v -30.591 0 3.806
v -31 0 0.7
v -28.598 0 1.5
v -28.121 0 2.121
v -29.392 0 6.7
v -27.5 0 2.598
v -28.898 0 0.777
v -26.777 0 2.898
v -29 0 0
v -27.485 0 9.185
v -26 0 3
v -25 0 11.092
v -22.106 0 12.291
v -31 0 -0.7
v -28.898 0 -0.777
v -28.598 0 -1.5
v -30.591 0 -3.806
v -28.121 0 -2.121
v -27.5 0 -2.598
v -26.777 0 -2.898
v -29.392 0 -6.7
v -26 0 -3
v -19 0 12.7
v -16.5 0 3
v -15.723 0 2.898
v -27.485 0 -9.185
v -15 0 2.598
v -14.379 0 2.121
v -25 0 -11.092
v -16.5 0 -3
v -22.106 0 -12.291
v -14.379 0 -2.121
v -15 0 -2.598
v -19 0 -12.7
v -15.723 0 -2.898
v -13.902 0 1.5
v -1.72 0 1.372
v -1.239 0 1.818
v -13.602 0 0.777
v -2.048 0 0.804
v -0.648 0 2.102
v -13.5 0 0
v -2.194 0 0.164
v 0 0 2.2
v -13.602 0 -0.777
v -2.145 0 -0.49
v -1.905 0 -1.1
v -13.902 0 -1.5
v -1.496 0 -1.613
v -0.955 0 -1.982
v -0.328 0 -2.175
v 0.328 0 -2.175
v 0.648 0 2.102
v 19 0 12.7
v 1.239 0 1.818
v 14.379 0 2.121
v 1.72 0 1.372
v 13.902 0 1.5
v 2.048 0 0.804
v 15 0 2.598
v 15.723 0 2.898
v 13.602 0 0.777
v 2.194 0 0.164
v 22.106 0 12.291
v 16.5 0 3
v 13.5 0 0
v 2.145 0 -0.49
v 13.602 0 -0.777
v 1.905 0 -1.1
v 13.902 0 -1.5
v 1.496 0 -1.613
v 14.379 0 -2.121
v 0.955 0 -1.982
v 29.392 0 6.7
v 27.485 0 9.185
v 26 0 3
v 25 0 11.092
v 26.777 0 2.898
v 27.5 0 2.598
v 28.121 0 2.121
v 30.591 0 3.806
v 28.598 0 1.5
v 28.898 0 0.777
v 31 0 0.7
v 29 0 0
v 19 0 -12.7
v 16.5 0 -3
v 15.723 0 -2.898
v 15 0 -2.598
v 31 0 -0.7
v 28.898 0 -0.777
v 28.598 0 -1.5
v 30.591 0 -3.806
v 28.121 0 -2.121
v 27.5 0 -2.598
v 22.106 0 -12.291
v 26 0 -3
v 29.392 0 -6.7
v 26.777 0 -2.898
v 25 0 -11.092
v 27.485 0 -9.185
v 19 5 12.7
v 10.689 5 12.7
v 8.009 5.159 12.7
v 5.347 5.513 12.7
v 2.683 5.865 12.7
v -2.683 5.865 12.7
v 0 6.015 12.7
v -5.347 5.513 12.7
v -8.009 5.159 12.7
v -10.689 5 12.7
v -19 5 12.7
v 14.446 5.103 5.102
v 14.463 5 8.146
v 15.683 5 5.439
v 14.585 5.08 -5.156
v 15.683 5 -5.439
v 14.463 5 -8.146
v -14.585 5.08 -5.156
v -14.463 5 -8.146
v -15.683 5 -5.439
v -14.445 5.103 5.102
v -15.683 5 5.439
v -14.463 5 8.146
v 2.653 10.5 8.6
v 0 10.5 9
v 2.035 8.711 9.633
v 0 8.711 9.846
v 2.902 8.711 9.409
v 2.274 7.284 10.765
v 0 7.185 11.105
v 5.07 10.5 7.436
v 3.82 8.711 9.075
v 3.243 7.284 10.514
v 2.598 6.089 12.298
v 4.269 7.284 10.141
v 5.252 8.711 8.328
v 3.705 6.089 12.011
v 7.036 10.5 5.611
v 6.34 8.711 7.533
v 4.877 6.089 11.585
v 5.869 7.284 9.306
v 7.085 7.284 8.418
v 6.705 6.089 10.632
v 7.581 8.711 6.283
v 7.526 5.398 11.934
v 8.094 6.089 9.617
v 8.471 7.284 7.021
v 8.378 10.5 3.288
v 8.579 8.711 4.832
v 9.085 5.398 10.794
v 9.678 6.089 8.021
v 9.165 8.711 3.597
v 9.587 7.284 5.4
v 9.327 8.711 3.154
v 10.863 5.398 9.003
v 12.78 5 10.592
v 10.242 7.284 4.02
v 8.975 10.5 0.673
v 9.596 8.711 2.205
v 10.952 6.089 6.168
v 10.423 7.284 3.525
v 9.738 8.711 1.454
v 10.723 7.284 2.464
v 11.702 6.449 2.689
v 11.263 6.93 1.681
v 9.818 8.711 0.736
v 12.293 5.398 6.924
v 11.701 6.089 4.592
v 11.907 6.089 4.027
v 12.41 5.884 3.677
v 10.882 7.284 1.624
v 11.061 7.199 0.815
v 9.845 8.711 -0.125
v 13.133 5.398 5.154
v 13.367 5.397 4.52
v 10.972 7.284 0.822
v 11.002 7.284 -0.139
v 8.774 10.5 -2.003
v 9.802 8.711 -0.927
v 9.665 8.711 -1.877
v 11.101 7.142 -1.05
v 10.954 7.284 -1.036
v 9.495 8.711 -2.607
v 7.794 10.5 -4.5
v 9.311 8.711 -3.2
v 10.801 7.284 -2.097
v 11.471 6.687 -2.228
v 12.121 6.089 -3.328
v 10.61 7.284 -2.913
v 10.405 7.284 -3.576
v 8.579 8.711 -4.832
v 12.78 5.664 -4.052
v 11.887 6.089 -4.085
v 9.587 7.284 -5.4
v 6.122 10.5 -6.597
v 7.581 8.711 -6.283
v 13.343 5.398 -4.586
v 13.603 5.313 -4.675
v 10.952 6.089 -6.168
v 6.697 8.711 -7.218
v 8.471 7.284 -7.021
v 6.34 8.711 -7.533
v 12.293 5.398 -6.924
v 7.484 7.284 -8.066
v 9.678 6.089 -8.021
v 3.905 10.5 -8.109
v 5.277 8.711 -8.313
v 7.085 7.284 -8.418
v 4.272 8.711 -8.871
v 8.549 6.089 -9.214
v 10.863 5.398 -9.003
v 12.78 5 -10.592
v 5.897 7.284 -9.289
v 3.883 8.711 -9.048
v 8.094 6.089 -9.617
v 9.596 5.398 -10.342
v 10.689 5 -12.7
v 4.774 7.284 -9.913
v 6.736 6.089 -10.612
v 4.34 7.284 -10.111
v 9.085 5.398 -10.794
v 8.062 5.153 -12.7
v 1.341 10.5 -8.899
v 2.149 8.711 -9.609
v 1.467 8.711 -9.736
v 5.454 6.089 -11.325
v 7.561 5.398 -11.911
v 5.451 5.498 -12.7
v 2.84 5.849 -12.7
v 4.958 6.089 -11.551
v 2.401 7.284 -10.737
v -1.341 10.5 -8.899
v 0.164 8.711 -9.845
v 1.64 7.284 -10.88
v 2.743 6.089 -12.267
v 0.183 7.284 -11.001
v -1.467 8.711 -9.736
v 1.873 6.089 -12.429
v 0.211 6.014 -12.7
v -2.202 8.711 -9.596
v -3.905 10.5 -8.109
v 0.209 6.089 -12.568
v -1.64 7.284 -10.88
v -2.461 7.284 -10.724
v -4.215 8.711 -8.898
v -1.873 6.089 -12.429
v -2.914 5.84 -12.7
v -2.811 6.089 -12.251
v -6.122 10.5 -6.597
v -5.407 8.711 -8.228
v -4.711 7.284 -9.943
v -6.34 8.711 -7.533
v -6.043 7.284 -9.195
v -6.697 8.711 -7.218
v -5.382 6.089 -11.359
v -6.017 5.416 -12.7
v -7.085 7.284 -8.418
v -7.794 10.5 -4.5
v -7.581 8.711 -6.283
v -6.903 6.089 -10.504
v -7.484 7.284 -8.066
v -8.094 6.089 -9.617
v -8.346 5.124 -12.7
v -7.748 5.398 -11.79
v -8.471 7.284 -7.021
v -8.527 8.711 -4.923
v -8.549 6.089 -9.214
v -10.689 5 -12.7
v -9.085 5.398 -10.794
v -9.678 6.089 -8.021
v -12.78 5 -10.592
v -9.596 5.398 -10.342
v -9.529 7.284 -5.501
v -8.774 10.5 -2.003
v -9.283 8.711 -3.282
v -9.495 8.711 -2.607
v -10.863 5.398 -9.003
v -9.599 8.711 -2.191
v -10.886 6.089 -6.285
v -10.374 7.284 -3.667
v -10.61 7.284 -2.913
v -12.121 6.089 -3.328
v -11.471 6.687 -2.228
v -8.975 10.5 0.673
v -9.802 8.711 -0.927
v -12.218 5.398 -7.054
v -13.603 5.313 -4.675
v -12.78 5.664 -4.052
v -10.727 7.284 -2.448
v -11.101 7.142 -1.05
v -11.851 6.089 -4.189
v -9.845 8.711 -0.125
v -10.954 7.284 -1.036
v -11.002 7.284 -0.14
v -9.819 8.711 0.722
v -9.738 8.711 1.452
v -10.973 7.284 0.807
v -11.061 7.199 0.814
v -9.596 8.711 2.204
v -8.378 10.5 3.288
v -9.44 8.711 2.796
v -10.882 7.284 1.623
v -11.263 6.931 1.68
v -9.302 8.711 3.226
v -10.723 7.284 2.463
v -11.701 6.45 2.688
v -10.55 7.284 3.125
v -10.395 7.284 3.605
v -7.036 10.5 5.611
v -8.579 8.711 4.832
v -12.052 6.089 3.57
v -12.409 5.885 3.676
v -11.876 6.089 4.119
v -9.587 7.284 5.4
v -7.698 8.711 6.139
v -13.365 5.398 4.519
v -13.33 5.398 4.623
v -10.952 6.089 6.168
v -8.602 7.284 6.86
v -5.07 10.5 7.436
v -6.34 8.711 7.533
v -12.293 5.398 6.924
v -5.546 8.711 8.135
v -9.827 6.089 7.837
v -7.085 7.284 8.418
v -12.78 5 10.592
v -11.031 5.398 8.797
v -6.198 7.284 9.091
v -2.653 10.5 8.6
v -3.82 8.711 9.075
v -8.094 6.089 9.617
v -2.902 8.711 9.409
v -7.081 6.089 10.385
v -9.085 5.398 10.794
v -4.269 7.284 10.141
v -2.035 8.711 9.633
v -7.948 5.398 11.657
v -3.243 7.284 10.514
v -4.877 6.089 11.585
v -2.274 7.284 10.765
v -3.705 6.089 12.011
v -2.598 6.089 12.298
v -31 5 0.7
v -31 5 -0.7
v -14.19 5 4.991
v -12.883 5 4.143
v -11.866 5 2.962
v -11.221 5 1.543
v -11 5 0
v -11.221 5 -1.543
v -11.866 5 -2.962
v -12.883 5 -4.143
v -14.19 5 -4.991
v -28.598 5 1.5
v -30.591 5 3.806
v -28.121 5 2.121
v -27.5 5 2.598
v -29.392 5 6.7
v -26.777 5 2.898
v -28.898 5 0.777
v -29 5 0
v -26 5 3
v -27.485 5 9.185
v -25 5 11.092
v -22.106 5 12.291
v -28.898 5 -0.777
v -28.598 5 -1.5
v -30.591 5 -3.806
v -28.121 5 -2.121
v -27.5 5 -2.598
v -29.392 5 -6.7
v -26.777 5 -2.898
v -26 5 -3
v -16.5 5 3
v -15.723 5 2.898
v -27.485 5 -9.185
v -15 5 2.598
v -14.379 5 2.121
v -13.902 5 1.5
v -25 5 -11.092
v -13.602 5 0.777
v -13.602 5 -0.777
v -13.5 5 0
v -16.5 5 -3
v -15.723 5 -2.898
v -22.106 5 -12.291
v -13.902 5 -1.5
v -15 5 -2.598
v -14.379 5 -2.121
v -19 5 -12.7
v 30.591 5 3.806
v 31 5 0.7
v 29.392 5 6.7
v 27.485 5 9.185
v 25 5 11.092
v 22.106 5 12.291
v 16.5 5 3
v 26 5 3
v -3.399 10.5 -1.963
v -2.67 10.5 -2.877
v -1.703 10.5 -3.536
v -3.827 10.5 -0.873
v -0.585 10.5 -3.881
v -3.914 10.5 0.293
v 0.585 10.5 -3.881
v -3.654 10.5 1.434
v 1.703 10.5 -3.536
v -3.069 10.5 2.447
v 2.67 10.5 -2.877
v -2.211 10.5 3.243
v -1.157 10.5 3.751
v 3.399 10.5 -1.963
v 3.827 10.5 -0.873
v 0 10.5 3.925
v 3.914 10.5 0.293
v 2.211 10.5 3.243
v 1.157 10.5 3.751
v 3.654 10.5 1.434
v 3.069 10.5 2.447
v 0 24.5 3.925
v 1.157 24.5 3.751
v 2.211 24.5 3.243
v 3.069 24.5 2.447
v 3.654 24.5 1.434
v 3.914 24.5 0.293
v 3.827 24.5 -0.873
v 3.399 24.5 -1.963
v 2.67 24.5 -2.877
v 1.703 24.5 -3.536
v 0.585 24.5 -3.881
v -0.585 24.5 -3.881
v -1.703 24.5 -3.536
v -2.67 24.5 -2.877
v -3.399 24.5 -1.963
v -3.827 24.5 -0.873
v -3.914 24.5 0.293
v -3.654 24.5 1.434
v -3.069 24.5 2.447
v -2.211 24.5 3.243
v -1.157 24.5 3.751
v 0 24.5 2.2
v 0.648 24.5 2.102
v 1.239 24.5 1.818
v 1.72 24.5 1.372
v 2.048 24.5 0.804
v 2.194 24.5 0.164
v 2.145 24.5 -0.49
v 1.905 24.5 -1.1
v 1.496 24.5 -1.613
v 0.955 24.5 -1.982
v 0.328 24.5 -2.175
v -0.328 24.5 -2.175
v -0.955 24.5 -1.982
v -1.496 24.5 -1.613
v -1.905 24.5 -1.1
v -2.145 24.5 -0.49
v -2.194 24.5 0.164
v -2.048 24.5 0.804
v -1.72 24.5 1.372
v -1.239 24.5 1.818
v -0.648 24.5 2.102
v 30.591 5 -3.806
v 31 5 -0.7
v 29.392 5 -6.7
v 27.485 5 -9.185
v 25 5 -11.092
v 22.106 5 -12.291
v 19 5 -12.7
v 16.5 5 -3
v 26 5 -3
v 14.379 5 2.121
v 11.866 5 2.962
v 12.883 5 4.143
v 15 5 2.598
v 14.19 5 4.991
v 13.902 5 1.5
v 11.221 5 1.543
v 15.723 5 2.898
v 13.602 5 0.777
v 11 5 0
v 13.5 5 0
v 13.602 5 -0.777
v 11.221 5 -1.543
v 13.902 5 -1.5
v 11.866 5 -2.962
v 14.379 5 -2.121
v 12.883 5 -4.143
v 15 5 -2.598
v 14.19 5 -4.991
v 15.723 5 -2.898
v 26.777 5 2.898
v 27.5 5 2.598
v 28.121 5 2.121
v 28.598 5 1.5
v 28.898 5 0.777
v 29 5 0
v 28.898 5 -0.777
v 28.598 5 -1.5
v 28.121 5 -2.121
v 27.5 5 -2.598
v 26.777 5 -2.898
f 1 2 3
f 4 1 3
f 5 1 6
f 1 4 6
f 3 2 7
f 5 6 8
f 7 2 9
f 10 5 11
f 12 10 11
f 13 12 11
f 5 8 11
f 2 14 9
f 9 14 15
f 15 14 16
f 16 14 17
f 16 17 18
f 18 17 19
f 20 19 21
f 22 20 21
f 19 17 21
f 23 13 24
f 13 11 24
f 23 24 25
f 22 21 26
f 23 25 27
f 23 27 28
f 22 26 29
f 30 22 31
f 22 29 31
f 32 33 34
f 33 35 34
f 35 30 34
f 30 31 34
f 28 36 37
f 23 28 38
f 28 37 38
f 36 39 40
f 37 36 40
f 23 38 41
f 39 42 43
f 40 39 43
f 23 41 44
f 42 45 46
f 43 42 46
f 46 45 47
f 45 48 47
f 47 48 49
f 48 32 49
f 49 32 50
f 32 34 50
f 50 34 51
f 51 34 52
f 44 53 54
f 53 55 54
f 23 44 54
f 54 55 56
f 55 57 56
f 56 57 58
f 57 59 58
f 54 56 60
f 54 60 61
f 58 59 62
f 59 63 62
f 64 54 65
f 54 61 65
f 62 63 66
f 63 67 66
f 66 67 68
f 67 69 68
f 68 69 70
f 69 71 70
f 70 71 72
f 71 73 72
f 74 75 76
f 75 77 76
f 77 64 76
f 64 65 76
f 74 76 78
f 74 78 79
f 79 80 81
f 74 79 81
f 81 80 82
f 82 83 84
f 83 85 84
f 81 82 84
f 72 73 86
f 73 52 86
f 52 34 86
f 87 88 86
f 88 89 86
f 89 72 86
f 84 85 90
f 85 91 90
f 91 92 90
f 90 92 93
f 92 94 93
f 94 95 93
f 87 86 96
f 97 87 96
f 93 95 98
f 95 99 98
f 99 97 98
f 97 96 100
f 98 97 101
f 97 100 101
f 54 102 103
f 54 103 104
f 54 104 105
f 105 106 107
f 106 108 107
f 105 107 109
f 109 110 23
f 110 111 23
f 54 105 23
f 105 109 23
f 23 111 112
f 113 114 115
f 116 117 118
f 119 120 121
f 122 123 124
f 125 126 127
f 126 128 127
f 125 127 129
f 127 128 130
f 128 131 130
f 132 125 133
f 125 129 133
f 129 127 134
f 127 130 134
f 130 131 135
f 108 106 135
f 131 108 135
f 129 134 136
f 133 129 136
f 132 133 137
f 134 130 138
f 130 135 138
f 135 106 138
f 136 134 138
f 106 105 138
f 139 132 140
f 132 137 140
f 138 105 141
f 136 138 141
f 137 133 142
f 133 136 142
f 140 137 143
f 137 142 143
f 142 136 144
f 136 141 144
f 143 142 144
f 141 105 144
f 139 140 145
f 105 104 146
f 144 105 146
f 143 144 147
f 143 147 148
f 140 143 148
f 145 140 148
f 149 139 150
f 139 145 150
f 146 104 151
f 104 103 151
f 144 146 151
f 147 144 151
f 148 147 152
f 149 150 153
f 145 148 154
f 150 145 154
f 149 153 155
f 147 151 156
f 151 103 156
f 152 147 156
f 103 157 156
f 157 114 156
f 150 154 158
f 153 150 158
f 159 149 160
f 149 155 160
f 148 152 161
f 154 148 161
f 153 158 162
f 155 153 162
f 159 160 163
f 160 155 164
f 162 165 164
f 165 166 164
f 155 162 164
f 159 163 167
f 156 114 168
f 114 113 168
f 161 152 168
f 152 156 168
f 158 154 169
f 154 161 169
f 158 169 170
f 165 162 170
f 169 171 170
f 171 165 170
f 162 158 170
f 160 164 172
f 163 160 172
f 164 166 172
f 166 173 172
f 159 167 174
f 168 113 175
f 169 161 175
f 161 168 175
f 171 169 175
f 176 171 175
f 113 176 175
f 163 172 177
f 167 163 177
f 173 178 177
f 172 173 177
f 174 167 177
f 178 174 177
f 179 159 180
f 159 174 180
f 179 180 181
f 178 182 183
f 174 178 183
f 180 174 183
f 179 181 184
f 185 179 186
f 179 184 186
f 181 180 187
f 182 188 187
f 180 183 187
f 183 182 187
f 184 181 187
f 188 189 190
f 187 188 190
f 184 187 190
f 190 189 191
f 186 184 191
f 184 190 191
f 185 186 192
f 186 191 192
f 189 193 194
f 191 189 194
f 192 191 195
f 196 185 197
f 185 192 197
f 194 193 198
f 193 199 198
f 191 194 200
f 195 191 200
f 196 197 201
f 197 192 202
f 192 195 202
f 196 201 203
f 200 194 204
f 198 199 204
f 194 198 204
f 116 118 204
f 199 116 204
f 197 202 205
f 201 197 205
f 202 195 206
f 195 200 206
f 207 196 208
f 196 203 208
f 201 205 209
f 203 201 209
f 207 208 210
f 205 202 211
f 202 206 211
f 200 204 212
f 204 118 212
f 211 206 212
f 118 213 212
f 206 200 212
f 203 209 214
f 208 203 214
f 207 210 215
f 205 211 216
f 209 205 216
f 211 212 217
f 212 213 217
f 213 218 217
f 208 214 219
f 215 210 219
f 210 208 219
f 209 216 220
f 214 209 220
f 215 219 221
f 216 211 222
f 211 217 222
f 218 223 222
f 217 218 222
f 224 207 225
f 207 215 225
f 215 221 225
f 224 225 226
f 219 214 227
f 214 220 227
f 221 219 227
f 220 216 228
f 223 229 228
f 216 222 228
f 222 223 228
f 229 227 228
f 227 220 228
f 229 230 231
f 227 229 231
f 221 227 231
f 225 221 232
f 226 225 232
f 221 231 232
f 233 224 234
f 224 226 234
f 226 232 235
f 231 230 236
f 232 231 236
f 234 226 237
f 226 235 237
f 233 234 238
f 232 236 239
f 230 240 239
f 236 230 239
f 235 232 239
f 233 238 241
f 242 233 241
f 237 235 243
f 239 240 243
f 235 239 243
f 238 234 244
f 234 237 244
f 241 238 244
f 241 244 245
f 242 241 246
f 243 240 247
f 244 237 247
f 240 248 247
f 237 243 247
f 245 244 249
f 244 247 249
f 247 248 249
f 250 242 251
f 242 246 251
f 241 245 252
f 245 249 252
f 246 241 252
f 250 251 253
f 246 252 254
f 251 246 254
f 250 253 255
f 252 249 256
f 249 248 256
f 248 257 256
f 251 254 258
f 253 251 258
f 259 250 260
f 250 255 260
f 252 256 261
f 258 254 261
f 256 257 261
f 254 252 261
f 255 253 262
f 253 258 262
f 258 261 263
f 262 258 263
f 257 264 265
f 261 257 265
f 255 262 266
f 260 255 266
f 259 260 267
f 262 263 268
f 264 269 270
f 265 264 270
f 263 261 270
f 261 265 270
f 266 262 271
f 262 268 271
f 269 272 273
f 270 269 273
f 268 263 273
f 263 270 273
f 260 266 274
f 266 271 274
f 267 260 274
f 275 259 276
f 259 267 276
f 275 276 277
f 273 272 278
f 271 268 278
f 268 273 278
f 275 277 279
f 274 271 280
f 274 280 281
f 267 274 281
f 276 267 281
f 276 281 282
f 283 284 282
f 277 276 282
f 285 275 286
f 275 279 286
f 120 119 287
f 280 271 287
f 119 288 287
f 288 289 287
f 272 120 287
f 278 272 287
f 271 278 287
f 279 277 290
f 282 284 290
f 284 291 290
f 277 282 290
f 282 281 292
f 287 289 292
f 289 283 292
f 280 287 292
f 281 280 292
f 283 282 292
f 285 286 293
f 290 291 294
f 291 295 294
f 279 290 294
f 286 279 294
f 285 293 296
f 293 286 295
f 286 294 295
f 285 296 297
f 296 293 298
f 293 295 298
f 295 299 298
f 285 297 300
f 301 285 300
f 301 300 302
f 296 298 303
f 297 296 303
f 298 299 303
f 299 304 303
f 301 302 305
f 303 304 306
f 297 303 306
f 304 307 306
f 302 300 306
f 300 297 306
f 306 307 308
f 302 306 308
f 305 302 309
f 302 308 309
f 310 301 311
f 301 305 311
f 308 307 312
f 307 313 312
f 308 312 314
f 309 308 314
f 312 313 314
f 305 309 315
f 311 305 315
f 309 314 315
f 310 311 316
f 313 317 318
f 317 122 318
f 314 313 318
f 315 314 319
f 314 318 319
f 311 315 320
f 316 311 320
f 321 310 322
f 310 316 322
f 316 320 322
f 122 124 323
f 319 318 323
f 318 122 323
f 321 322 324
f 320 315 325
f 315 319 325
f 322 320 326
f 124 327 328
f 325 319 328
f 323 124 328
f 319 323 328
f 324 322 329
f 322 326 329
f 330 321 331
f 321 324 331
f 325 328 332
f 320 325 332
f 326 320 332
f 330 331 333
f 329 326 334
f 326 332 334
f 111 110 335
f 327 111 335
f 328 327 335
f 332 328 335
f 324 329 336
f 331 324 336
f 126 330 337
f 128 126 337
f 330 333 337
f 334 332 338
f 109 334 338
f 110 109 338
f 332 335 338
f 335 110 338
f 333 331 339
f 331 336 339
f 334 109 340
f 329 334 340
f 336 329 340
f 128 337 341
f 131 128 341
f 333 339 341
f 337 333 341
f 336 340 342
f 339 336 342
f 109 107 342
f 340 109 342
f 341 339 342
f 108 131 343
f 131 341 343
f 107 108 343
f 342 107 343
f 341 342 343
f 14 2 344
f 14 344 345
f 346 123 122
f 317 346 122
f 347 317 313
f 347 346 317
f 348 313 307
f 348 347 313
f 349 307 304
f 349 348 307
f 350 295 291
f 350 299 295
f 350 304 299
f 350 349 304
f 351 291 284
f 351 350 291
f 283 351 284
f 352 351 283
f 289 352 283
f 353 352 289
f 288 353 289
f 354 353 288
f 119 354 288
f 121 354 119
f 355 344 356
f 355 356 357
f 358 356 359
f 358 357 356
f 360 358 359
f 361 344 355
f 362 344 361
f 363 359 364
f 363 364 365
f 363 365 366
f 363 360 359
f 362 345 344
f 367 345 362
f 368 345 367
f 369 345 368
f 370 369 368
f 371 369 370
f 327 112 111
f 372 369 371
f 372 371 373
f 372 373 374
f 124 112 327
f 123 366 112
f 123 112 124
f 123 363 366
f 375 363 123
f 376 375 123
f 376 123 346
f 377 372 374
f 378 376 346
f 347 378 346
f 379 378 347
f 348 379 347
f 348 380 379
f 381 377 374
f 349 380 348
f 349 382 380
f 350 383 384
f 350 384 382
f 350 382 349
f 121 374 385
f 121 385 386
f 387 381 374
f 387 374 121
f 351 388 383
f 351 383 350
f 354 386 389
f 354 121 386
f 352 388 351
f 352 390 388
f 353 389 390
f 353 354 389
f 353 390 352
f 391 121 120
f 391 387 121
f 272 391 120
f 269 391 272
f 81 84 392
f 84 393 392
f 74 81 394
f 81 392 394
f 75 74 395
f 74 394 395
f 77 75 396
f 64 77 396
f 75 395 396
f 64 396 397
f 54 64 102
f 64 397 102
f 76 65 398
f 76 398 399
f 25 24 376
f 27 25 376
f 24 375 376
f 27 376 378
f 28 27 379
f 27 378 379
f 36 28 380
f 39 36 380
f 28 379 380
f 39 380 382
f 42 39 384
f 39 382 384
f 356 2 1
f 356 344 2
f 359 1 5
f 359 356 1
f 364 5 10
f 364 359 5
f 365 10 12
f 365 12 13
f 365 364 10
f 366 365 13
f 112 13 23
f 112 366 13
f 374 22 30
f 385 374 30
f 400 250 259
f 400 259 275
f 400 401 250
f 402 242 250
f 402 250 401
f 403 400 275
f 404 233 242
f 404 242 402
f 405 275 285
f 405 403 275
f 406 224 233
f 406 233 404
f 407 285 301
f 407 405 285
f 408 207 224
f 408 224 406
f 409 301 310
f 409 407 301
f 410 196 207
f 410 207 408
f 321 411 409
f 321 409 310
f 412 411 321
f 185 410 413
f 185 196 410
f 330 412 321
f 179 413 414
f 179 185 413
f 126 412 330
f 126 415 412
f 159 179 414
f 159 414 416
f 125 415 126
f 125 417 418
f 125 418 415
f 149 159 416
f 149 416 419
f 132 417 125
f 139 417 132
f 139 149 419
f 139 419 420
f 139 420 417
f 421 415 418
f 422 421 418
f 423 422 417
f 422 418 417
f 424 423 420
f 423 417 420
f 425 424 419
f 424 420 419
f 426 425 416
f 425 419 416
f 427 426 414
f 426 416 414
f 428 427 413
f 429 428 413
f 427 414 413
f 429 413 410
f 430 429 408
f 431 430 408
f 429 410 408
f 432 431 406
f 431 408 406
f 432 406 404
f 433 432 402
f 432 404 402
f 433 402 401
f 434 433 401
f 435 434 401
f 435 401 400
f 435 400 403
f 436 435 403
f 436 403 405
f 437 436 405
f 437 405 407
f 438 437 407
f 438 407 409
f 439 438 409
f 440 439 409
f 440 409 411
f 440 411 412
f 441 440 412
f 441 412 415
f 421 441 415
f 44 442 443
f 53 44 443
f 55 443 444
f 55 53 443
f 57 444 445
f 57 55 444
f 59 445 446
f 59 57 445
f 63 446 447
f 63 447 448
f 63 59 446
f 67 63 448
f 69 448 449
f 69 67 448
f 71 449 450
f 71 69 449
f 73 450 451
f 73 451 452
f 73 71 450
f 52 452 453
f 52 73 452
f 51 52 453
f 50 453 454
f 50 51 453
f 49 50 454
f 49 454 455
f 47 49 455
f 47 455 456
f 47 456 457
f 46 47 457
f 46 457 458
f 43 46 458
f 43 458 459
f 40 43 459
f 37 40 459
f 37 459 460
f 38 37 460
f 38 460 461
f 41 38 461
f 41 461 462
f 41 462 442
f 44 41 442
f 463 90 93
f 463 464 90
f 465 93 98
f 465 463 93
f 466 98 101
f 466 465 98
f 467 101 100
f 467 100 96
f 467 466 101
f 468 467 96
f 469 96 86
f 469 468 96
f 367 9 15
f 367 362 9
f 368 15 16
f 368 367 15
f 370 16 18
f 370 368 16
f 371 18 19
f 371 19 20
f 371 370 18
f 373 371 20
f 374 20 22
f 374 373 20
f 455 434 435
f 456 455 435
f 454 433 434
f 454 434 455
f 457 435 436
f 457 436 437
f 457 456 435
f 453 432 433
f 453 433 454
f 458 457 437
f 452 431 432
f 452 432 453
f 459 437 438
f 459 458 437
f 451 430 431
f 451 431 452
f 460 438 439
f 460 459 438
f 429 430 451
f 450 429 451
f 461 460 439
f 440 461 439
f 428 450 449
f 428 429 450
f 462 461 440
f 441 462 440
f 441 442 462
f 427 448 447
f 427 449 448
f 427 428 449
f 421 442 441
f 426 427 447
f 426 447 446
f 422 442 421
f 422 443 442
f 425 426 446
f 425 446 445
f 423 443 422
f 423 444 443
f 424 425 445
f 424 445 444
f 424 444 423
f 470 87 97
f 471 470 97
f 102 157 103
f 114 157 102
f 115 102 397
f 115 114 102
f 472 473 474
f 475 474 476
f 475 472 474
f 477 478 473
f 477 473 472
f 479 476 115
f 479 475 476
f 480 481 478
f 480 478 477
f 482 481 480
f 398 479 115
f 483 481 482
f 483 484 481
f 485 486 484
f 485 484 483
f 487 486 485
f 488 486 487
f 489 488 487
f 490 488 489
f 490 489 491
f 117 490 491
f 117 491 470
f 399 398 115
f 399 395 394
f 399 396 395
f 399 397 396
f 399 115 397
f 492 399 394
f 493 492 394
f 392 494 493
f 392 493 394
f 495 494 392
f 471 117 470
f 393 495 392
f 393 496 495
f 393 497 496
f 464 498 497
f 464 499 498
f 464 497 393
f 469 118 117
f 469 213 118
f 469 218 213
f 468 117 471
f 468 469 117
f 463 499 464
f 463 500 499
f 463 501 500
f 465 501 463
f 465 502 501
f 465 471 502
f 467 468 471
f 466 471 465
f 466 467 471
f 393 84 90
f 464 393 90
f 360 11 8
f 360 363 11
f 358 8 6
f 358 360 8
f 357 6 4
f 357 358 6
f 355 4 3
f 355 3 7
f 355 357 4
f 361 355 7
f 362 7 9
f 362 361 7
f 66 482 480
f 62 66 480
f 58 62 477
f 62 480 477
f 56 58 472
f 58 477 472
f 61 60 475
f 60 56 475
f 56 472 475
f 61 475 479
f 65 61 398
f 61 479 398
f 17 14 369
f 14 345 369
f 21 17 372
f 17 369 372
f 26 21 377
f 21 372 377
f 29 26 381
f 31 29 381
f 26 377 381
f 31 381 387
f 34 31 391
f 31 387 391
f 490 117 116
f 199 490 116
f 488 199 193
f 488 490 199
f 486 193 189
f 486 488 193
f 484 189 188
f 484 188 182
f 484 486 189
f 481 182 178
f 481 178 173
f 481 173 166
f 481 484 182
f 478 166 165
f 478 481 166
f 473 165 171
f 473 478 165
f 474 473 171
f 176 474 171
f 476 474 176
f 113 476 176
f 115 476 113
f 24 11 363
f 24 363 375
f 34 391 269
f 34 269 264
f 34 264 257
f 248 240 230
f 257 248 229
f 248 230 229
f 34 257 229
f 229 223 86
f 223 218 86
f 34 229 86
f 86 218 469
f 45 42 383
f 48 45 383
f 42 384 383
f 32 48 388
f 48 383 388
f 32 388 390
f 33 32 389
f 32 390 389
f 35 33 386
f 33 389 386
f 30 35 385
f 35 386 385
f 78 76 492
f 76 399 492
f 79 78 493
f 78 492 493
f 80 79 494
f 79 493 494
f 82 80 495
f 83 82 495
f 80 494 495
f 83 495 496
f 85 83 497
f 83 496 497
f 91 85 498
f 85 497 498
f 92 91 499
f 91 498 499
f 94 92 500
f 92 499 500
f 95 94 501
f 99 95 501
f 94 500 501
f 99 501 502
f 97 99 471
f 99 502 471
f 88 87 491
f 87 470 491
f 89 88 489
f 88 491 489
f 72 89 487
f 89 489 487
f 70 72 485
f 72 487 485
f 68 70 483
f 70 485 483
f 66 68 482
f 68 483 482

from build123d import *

# Parameters (mm, degrees)
SKETCH1_W           = 62
SKETCH1_H           = 25.4
SKETCH1_R           = 3.925
SKETCH1_W_2         = 15.5
SKETCH1_H_2         = 6
BOSS_EXTRUDE1_DEPTH = 5
SKETCH1_3_R         = 3.925
SKETCH1_3_R_2       = 2.2
BOSS_EXTRUDE2_DEPTH = 24.5
FILLET1_R           = 3
SKETCH2_R           = 9
BOSS_EXTRUDE3_DEPTH = 5.5
FILLET2_R           = 8
SKETCH3_R           = 5.5
CUT_EXTRUDE1_DEPTH  = 5.5
FILLET3_R           = 12
SKETCH4_R           = 2.2
CUT_EXTRUDE2_DEPTH  = 42.503493918


# Some blends are built 0.0001 mm under size
with BuildPart() as part:
    # Sketch1 → Boss-Extrude1 (new body)
    with BuildSketch(Plane(origin=(0, 0, 0), x_dir=(1, 0, 0), z_dir=(0, 1, 0))):
        Rectangle(SKETCH1_W, SKETCH1_H)
        with Locations(Location((0, 0, 0), (0, 0, 270))):
            Circle(SKETCH1_R, mode=Mode.SUBTRACT)
        with Locations((-21.25, 0)):
            Rectangle(SKETCH1_W_2, SKETCH1_H_2, mode=Mode.SUBTRACT)
        with Locations((21.25, 0)):
            Rectangle(SKETCH1_W_2, SKETCH1_H_2, mode=Mode.SUBTRACT)
    extrude(amount=BOSS_EXTRUDE1_DEPTH)

    # Sketch1<3> → Boss-Extrude2 (add)
    with BuildSketch(Plane(origin=(0, 0, 0), x_dir=(1, 0, 0), z_dir=(0, 1, 0))):
        with Locations(Location((0, 0, 0), (0, 0, 270))):
            Circle(SKETCH1_3_R)
        with Locations(Location((0, 0, 0), (0, 0, 270))):
            Circle(SKETCH1_3_R_2, mode=Mode.SUBTRACT)
    extrude(amount=BOSS_EXTRUDE2_DEPTH)

    # Fillet1
    fillet1_edges = [part.edges().sort_by_distance(p)[0] for p in [
        (29, 2.5, 3),
        (13.5, 2.5, 3),
        (29, 2.5, -3),
        (13.5, 2.5, -3),
        (-29, 2.5, 3),
        (-29, 2.5, -3),
        (-13.5, 2.5, 3),
        (-13.5, 2.5, -3),
    ]]
    fillet(fillet1_edges, radius=FILLET1_R - 0.0001)  # a hair under: the kernel refuses the full size

    # Sketch2 → Boss-Extrude3 (add)
    with BuildSketch(Plane(origin=(0, 5, 0), x_dir=(1, 0, 0), z_dir=(0, 1, 0))):
        with Locations(Location((0, 0, 0), (0, 0, 270))):
            Circle(SKETCH2_R)
    extrude(amount=BOSS_EXTRUDE3_DEPTH)

    # Fillet2
    # the kernel refuses this fillet: 8 mm, written as the material it adds along each edge
    with BuildSketch(Plane(origin=(0, 5, 0), x_dir=(0, 0, 1), z_dir=(-1, 0, 0))) as fillet2_piece_1_section:
        with BuildLine():
            CenterArc((16.599342077, 8), FILLET2_R, 198.209956864, 71.790043136)
            Line((9, 5.5), (9, 0))
            Line((9, 0), (16.599342077, 0))
        make_face()
    fillet2_piece_1 = revolve(axis=Axis((0, 5, 0), (0, 1, 0)), mode=Mode.PRIVATE)
    fillet2_piece_1 = fillet2_piece_1 - Plane(origin=(-16.4999, 5, -0.0001), x_dir=(0, 0, -1), z_dir=(0, 1, 0)) * Cylinder(2.9999, 67, mode=Mode.PRIVATE)
    fillet2_piece_1 = split(fillet2_piece_1, bisect_by=Plane(origin=(0, 5, 12.7), z_dir=(0, 0, -1)), keep=Keep.TOP, mode=Mode.PRIVATE)
    fillet2_piece_1 = split(fillet2_piece_1, bisect_by=Plane(origin=(0, 5, -12.7), z_dir=(0, 0, 1)), keep=Keep.TOP, mode=Mode.PRIVATE)
    fillet2_piece_1 = fillet2_piece_1 - Plane(origin=(16.4999, 5, 0.0001), x_dir=(0, 0, 1), z_dir=(0, 1, 0)) * Cylinder(2.9999, 67, mode=Mode.PRIVATE)
    add(fillet2_piece_1)

    # Sketch3 → Cut-Extrude1 (cut)
    with BuildSketch(Plane(origin=(0, 5, 0), x_dir=(1, 0, 0), z_dir=(0, 1, 0))):
        with Locations((16.5, 0)):
            Circle(SKETCH3_R)
        with Locations((-16.5, 0)):
            Circle(SKETCH3_R)
    extrude(amount=CUT_EXTRUDE1_DEPTH, mode=Mode.SUBTRACT)

    # Fillet3
    fillet3_edges = [part.edges().sort_by_distance(p)[0] for p in [
        (-31, 2.5, 12.7),
        (-31, 2.5, -12.7),
        (31, 2.5, -12.7),
        (31, 2.5, 12.7),
    ]]
    fillet(fillet3_edges, radius=FILLET3_R)

    # Sketch4 → Cut-Extrude2 (cut, through all)
    with BuildSketch(Plane(origin=(0, 24.5, 0), x_dir=(1, 0, 0), z_dir=(0, 1, 0))):
        with Locations(Location((0, 0, 0), (0, 0, 270))):
            Circle(SKETCH4_R)
    extrude(amount=-CUT_EXTRUDE2_DEPTH, mode=Mode.SUBTRACT)


solid = part.part
